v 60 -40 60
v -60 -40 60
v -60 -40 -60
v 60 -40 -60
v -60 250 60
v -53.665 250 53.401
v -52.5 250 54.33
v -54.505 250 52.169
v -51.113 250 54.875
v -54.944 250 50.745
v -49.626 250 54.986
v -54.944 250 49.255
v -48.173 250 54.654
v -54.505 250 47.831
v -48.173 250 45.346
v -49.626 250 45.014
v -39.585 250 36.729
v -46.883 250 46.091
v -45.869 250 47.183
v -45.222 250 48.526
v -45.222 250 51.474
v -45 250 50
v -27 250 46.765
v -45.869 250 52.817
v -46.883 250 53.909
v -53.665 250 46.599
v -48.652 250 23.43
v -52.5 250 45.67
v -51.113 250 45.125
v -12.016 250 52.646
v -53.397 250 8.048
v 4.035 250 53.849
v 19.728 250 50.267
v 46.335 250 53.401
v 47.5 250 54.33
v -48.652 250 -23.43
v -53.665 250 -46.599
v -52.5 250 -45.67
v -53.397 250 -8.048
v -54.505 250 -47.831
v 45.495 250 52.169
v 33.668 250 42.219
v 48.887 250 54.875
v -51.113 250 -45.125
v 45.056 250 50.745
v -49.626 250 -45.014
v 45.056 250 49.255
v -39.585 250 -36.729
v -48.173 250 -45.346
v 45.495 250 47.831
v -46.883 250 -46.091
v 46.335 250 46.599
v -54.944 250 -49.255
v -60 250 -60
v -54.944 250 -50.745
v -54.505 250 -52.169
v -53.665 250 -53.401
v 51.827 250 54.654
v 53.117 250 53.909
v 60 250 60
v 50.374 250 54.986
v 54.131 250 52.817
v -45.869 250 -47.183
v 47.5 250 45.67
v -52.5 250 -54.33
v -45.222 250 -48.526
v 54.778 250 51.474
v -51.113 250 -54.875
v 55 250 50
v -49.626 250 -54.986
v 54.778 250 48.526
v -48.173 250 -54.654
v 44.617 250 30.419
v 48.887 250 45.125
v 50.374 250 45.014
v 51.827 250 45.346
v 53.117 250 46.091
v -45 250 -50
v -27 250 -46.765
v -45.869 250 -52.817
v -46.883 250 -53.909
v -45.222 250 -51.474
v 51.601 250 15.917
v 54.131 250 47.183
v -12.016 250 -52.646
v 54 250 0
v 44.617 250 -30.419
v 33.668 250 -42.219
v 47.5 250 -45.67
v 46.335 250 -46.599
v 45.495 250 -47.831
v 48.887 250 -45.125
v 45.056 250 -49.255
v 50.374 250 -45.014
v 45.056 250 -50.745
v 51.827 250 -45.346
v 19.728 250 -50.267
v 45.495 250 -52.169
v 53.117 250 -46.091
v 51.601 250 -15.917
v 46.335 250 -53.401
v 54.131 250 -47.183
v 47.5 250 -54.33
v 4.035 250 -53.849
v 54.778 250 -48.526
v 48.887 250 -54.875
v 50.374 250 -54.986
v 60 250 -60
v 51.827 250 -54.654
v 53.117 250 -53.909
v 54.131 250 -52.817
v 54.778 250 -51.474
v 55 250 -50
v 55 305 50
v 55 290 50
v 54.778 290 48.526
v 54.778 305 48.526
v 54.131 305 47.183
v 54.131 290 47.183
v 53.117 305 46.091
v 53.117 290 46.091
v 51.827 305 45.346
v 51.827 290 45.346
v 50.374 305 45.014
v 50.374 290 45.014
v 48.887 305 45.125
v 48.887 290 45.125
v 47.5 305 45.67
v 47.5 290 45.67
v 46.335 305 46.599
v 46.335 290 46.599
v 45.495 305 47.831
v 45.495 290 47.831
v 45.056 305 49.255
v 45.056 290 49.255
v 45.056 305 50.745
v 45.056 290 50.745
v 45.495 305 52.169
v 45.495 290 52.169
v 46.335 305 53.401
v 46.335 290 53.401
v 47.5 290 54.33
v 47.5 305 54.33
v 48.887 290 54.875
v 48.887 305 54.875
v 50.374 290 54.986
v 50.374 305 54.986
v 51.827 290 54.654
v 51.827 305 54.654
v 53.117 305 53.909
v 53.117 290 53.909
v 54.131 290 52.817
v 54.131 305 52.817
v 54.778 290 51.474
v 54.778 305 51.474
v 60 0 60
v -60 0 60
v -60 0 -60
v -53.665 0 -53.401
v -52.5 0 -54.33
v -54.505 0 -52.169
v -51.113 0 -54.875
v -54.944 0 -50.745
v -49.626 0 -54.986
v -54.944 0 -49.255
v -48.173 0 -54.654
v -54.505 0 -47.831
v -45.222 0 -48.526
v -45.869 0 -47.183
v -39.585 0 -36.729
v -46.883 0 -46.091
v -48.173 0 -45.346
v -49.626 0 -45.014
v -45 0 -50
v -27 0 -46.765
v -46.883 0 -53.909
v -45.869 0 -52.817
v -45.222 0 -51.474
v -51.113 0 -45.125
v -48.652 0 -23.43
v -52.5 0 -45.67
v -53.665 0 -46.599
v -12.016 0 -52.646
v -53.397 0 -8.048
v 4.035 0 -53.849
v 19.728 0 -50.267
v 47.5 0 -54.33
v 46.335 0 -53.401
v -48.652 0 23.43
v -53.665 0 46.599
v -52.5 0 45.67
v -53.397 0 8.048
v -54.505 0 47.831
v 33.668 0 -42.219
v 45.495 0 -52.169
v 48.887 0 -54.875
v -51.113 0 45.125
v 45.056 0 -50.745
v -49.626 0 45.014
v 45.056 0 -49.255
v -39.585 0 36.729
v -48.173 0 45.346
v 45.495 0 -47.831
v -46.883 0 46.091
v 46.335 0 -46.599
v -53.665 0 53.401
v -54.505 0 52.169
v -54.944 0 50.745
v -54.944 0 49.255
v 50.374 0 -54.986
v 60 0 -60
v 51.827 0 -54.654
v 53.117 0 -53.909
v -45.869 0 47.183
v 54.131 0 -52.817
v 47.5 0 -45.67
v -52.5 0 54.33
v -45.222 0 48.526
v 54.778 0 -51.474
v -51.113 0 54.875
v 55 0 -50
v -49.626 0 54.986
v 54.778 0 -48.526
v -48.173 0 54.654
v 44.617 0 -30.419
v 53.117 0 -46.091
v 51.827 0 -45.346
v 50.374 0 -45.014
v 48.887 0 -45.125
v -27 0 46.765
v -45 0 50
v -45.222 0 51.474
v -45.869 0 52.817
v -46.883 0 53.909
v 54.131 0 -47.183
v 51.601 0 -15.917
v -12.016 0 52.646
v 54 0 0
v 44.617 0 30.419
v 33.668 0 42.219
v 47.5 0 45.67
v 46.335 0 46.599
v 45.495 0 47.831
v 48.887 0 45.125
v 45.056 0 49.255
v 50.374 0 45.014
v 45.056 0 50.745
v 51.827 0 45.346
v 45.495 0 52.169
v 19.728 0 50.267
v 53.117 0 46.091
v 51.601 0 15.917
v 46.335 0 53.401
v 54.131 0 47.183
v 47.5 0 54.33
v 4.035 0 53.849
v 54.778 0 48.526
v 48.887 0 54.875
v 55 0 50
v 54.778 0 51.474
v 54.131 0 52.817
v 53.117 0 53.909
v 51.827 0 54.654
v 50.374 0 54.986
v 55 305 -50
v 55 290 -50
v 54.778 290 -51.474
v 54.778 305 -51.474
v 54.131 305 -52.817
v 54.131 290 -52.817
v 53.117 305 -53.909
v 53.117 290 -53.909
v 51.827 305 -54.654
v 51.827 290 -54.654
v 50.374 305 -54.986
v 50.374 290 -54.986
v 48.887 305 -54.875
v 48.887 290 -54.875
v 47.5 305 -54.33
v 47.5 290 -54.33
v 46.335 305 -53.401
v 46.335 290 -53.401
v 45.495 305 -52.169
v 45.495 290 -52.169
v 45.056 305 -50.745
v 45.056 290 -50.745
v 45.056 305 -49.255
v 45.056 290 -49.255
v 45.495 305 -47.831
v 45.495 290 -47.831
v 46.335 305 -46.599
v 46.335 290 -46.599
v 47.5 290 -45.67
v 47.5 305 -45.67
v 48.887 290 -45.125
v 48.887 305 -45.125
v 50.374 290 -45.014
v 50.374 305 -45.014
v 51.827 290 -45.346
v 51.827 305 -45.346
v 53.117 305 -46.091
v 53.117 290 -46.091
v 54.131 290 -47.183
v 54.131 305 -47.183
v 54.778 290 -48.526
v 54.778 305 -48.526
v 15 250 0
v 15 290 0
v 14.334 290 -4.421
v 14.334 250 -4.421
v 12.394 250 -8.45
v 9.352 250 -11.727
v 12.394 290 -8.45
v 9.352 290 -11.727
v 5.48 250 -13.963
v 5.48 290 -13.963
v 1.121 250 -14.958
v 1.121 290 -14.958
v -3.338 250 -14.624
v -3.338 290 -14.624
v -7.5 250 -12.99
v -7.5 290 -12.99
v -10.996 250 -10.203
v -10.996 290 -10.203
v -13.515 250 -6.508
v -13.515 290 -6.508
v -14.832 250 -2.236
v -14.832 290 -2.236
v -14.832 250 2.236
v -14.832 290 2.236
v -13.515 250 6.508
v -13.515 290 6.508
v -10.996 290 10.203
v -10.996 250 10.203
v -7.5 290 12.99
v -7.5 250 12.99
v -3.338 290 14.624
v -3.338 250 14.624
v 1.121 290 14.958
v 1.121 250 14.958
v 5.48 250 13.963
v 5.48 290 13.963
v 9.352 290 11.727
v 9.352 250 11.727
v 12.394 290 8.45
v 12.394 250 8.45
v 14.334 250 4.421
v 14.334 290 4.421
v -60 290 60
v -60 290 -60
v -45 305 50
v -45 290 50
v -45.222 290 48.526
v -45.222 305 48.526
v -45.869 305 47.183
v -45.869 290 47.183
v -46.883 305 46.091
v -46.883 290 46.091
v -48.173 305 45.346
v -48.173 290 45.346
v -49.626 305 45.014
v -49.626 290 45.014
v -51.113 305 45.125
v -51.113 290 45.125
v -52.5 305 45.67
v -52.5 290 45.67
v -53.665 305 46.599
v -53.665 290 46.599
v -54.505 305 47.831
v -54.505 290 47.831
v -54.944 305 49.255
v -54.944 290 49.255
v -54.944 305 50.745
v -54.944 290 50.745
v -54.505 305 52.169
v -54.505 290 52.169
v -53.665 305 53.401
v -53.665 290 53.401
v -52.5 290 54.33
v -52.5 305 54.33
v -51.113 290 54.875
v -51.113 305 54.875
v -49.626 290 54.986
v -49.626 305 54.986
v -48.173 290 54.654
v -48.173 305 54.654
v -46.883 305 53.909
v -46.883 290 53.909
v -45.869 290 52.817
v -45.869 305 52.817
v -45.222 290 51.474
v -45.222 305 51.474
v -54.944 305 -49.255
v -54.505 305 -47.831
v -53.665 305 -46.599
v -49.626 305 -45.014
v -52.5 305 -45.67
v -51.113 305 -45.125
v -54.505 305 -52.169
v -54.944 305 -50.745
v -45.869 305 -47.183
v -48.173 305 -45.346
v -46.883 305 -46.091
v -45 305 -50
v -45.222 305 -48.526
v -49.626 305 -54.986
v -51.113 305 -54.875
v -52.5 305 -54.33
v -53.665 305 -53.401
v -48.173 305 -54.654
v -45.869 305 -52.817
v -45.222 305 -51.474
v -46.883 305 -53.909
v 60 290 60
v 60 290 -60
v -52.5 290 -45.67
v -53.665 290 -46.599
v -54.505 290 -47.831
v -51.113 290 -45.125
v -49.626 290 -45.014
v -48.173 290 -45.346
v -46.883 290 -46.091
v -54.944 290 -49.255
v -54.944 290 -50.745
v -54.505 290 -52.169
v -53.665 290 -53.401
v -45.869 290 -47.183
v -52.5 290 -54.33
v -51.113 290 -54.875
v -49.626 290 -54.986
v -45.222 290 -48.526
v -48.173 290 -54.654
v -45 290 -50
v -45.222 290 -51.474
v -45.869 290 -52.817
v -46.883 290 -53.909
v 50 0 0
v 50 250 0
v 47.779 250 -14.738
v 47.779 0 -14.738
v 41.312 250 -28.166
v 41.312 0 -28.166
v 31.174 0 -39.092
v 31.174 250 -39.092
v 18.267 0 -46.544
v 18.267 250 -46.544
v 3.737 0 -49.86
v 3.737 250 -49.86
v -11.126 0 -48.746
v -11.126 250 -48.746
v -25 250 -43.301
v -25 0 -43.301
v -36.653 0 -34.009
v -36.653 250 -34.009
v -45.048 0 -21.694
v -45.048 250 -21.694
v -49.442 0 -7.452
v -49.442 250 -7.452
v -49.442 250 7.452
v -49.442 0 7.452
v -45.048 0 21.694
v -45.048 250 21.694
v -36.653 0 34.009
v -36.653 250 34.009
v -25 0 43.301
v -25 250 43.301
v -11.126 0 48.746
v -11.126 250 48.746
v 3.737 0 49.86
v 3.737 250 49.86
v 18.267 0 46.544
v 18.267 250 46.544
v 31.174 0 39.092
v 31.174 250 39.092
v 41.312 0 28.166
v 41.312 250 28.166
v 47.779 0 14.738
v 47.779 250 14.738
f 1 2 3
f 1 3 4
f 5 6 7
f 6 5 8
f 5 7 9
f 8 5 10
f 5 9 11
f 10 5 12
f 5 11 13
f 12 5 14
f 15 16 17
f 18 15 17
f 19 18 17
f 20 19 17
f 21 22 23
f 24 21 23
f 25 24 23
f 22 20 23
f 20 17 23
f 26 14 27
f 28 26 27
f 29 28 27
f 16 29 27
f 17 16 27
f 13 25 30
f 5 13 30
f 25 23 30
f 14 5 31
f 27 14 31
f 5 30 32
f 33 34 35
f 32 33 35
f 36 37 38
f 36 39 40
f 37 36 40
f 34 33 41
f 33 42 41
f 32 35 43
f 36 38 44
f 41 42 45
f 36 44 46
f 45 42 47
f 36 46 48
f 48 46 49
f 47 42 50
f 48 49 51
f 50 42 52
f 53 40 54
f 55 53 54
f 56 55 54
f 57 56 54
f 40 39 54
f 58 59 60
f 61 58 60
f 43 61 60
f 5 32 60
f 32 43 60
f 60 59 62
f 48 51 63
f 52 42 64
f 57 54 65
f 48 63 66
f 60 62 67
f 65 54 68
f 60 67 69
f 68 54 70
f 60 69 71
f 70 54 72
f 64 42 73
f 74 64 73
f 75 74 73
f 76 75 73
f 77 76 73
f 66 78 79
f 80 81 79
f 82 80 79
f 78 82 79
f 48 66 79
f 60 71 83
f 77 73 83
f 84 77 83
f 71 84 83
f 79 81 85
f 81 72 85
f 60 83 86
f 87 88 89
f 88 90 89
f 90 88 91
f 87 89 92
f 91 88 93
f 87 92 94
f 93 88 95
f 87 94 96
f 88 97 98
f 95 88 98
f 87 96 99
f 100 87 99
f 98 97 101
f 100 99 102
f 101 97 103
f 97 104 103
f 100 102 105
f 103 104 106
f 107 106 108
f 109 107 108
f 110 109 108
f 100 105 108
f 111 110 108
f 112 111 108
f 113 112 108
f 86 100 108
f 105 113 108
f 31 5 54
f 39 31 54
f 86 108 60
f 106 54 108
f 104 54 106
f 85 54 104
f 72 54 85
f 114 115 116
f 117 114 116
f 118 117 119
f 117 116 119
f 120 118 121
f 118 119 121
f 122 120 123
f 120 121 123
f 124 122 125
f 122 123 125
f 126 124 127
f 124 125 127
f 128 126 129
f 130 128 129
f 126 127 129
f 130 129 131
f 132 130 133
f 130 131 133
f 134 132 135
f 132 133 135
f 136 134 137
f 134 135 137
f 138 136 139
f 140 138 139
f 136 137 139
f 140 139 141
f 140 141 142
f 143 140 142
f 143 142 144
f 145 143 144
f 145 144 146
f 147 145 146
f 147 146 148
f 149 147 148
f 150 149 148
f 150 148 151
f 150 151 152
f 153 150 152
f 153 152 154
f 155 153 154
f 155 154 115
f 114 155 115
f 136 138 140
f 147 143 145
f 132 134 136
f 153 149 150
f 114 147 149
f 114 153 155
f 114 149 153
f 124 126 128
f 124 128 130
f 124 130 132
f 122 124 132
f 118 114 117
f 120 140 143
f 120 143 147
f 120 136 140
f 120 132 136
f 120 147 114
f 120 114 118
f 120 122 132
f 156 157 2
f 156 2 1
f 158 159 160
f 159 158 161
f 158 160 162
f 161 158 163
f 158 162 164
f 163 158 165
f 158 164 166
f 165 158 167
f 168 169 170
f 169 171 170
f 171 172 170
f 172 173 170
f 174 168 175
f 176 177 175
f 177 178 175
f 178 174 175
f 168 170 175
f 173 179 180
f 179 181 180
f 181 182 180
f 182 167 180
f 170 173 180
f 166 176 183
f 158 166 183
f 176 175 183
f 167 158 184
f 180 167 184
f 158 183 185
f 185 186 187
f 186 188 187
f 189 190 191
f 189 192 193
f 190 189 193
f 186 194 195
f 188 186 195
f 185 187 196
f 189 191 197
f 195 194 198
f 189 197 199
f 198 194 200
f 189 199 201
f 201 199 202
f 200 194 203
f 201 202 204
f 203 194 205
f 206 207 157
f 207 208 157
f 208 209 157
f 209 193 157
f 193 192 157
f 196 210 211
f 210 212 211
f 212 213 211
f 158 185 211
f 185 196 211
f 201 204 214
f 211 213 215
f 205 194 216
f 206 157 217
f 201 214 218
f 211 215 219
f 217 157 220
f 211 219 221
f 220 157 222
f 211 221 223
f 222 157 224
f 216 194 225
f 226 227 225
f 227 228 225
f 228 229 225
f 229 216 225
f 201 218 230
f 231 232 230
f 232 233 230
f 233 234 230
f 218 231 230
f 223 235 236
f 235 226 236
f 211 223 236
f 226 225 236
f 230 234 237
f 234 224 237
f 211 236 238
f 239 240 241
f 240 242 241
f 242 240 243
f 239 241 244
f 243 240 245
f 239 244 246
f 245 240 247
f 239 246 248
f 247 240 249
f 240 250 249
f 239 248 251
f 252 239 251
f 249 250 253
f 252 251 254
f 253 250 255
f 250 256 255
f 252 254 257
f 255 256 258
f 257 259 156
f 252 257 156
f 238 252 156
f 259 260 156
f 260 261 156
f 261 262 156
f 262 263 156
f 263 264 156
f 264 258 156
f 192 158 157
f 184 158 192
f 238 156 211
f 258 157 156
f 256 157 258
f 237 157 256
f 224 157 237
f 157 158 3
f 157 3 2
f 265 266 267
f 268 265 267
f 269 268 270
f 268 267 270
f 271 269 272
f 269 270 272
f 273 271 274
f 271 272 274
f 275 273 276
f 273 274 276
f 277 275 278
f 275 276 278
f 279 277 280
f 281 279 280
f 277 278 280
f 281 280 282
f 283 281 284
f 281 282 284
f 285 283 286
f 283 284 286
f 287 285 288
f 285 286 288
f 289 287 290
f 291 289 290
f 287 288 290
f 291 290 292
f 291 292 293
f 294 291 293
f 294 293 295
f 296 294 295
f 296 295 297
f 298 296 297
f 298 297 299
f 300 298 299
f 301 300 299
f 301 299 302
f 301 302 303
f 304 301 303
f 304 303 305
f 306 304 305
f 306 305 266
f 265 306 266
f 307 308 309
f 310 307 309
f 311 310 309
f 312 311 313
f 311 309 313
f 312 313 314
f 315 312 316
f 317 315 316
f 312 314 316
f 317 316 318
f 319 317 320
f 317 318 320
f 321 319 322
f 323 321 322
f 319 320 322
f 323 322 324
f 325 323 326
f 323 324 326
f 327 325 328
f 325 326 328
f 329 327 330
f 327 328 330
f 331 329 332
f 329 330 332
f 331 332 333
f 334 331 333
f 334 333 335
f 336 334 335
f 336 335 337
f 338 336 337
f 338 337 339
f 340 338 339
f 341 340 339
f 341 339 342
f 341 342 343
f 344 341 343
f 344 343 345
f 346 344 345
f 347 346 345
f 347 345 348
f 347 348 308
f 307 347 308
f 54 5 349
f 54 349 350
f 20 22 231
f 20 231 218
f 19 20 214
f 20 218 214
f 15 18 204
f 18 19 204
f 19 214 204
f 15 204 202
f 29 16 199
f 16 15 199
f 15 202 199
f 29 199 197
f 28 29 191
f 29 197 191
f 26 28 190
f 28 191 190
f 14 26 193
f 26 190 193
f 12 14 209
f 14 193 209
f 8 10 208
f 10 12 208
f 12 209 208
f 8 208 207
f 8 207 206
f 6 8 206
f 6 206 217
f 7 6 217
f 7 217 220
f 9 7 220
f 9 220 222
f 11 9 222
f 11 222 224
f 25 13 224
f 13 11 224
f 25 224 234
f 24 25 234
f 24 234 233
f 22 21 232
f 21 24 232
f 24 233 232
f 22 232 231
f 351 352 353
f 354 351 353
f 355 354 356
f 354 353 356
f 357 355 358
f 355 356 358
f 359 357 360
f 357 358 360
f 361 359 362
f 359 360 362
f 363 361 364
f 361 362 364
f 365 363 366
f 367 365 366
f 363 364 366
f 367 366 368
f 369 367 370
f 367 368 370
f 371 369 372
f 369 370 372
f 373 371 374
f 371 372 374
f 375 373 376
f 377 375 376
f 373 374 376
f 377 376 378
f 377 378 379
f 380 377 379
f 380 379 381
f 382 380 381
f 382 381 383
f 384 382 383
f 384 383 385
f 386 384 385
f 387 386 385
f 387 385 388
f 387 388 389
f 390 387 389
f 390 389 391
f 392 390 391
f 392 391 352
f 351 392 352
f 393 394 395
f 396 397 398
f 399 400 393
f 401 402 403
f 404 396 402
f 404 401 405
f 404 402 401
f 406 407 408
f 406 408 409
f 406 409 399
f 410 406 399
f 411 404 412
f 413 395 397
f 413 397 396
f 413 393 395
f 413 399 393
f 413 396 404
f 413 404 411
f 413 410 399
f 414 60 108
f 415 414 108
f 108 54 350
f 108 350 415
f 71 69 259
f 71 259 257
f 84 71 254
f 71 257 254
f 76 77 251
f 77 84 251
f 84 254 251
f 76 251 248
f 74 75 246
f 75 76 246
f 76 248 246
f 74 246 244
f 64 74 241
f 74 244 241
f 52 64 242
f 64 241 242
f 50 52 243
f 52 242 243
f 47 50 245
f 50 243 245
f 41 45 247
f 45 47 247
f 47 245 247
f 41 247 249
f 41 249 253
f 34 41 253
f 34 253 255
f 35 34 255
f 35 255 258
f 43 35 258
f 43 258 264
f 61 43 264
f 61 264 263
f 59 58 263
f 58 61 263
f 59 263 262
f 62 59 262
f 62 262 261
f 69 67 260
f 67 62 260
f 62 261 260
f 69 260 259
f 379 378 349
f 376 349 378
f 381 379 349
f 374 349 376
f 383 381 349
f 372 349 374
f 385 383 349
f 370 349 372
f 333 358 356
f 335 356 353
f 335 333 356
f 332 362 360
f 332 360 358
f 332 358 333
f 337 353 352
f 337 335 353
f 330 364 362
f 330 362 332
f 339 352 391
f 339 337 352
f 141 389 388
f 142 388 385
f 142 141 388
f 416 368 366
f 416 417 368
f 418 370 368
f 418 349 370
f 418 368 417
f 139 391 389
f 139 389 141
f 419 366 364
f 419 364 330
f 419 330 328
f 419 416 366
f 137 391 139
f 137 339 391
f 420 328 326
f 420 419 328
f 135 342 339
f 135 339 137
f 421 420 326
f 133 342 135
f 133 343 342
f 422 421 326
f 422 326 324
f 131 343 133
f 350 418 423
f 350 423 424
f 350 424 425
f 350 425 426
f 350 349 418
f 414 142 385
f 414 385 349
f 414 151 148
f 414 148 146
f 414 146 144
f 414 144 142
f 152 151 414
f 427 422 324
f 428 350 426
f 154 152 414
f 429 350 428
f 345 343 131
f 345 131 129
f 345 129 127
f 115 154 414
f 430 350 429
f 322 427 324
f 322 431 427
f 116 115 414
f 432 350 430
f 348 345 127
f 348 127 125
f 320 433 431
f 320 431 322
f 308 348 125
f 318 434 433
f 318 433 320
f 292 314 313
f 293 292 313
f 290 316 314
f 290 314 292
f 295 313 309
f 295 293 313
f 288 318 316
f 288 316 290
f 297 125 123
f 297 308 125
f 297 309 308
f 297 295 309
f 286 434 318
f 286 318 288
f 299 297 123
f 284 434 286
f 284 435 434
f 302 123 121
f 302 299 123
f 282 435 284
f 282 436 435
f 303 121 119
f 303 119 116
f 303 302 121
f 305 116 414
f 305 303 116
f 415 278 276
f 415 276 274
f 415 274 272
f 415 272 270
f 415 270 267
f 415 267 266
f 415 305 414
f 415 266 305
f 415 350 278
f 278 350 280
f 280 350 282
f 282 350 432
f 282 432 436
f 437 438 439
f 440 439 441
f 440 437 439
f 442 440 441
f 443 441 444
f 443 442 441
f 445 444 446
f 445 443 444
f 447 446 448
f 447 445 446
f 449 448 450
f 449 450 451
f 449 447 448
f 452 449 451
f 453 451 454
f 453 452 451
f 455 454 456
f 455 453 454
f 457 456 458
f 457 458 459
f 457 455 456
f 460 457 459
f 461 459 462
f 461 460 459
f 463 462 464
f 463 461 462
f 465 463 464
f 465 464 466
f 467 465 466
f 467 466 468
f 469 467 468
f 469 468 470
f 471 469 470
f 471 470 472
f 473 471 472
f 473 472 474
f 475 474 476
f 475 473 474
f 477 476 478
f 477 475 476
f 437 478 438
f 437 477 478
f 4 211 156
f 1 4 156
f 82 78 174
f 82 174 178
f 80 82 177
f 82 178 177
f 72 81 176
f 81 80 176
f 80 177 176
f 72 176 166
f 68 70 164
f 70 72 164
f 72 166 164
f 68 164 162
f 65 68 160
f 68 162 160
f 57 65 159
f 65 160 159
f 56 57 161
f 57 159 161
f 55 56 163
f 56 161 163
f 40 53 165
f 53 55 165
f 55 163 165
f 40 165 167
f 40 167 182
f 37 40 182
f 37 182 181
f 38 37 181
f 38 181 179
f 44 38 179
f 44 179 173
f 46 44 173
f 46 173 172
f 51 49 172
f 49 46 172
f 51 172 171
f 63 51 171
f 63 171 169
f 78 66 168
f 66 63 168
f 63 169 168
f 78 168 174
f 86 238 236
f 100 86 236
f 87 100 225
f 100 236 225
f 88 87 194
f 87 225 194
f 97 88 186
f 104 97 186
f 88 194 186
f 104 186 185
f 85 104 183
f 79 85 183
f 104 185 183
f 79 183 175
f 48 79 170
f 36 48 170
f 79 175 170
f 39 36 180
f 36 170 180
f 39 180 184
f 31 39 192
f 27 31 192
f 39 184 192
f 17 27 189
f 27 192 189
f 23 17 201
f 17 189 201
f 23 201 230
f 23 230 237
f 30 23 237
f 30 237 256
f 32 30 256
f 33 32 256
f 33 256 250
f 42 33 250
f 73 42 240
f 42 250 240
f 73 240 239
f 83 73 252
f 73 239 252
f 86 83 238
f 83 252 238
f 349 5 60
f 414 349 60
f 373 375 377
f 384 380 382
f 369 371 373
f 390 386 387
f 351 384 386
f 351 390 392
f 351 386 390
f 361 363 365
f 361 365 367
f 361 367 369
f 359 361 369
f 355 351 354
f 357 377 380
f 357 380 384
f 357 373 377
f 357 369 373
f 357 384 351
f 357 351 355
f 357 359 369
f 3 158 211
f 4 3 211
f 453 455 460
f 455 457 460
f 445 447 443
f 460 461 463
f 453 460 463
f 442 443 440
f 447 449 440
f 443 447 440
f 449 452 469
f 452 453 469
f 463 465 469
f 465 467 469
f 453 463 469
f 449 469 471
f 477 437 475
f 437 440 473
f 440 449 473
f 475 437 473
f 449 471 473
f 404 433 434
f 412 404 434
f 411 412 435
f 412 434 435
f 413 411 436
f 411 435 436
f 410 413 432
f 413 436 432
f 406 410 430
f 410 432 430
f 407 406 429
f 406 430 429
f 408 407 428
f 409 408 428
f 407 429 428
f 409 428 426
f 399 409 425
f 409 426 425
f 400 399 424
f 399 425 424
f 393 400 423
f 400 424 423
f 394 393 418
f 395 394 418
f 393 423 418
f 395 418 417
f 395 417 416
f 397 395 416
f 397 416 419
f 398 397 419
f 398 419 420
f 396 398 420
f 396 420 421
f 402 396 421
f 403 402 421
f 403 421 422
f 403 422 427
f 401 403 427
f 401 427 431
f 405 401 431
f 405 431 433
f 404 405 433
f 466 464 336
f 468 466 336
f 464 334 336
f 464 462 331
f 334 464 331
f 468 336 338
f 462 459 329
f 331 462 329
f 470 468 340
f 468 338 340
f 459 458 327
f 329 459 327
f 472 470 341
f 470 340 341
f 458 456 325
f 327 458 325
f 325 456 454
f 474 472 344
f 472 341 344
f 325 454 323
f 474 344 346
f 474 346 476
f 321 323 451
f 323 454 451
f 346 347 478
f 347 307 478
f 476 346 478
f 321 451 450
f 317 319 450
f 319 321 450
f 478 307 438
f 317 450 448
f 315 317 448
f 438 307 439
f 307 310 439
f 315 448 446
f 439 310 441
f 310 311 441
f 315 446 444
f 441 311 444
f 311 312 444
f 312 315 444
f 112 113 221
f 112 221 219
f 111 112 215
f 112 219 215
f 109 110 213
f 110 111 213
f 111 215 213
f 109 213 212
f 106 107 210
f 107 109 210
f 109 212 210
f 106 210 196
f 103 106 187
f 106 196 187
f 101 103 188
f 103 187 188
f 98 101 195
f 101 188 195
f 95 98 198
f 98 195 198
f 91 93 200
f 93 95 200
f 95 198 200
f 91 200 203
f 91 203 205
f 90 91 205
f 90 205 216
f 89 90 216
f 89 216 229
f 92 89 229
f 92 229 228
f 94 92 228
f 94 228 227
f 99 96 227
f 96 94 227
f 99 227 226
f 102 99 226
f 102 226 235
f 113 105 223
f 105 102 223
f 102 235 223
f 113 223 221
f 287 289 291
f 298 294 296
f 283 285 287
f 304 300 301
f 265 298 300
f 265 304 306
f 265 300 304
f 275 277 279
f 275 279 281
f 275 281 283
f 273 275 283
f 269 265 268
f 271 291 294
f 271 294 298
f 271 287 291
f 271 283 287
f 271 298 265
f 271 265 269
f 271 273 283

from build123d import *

# Parameters (mm, degrees)
SKETCH1_R            = 54
SKETCH1_R_2          = 50
BOSS_EXTRUDE1_DEPTH  = 250
SKETCH2_W            = 120
SKETCH2_H            = 120
BOSS_EXTRUDE2_DEPTH  = 40
SKETCH3_W            = 120
SKETCH3_H            = 120
BOSS_EXTRUDE3_DEPTH  = 40
CUT_EXTRUDE1_REACH   = 332
SKETCH4_R            = 15
BOSS_EXTRUDE4_START  = -295
SKETCH5_R            = 5
BOSS_EXTRUDE4_DEPTH  = 310
LPATTERN1_COUNT      = 2
LPATTERN1_PITCH      = 100
LPATTERN1_COUNT_DIR2 = 2
LPATTERN1_PITCH_DIR2 = 100


with BuildPart() as part:
    # Sketch1 → Boss-Extrude1 (new body)
    with BuildSketch(Plane(origin=(0, 0, 0), x_dir=(1, 0, 0), z_dir=(0, 1, 0))):
        Circle(SKETCH1_R)
        Circle(SKETCH1_R_2, mode=Mode.SUBTRACT)
    extrude(amount=BOSS_EXTRUDE1_DEPTH)

    # Sketch2 → Boss-Extrude2 (add)
    with BuildSketch(Plane.XZ):
        Rectangle(SKETCH2_W, SKETCH2_H)
    extrude(amount=BOSS_EXTRUDE2_DEPTH)

    # Sketch3 → Boss-Extrude3 (add)
    with BuildSketch(Plane(origin=(0, 250, 0), x_dir=(1, 0, 0), z_dir=(0, 1, 0))):
        Rectangle(SKETCH3_W, SKETCH3_H)
    extrude(amount=BOSS_EXTRUDE3_DEPTH)

    # Sketch4 → Cut-Extrude1 (cut, up to next)
    with BuildSketch(Plane(origin=(0, 290, 0), x_dir=(1, 0, 0), z_dir=(0, 1, 0)), mode=Mode.PRIVATE) as cut_extrude1_sk1:
        Circle(SKETCH4_R)
    cut_extrude1_tool1 = extrude(cut_extrude1_sk1.sketch, amount=-CUT_EXTRUDE1_REACH, mode=Mode.PRIVATE) & part.part
    add(cut_extrude1_tool1.solids().sort_by_distance((0, 290, 0))[0], mode=Mode.SUBTRACT)

    # Sketch5 → Boss-Extrude4 (add)
    with BuildSketch(Plane(origin=(0, 290, 0), x_dir=(1, 0, 0), z_dir=(0, 1, 0)).offset(BOSS_EXTRUDE4_START)):
        with Locations((-50, 50)):
            Circle(SKETCH5_R)
    boss_extrude4 = extrude(amount=BOSS_EXTRUDE4_DEPTH)

    # LPattern1: Boss-Extrude4 2 × 2
    with Locations(*[(i * LPATTERN1_PITCH, 0, j * LPATTERN1_PITCH_DIR2) for i in range(LPATTERN1_COUNT) for j in range(LPATTERN1_COUNT_DIR2) if (i, j) != (0, 0)]):
        add(boss_extrude4)


solid = part.part
